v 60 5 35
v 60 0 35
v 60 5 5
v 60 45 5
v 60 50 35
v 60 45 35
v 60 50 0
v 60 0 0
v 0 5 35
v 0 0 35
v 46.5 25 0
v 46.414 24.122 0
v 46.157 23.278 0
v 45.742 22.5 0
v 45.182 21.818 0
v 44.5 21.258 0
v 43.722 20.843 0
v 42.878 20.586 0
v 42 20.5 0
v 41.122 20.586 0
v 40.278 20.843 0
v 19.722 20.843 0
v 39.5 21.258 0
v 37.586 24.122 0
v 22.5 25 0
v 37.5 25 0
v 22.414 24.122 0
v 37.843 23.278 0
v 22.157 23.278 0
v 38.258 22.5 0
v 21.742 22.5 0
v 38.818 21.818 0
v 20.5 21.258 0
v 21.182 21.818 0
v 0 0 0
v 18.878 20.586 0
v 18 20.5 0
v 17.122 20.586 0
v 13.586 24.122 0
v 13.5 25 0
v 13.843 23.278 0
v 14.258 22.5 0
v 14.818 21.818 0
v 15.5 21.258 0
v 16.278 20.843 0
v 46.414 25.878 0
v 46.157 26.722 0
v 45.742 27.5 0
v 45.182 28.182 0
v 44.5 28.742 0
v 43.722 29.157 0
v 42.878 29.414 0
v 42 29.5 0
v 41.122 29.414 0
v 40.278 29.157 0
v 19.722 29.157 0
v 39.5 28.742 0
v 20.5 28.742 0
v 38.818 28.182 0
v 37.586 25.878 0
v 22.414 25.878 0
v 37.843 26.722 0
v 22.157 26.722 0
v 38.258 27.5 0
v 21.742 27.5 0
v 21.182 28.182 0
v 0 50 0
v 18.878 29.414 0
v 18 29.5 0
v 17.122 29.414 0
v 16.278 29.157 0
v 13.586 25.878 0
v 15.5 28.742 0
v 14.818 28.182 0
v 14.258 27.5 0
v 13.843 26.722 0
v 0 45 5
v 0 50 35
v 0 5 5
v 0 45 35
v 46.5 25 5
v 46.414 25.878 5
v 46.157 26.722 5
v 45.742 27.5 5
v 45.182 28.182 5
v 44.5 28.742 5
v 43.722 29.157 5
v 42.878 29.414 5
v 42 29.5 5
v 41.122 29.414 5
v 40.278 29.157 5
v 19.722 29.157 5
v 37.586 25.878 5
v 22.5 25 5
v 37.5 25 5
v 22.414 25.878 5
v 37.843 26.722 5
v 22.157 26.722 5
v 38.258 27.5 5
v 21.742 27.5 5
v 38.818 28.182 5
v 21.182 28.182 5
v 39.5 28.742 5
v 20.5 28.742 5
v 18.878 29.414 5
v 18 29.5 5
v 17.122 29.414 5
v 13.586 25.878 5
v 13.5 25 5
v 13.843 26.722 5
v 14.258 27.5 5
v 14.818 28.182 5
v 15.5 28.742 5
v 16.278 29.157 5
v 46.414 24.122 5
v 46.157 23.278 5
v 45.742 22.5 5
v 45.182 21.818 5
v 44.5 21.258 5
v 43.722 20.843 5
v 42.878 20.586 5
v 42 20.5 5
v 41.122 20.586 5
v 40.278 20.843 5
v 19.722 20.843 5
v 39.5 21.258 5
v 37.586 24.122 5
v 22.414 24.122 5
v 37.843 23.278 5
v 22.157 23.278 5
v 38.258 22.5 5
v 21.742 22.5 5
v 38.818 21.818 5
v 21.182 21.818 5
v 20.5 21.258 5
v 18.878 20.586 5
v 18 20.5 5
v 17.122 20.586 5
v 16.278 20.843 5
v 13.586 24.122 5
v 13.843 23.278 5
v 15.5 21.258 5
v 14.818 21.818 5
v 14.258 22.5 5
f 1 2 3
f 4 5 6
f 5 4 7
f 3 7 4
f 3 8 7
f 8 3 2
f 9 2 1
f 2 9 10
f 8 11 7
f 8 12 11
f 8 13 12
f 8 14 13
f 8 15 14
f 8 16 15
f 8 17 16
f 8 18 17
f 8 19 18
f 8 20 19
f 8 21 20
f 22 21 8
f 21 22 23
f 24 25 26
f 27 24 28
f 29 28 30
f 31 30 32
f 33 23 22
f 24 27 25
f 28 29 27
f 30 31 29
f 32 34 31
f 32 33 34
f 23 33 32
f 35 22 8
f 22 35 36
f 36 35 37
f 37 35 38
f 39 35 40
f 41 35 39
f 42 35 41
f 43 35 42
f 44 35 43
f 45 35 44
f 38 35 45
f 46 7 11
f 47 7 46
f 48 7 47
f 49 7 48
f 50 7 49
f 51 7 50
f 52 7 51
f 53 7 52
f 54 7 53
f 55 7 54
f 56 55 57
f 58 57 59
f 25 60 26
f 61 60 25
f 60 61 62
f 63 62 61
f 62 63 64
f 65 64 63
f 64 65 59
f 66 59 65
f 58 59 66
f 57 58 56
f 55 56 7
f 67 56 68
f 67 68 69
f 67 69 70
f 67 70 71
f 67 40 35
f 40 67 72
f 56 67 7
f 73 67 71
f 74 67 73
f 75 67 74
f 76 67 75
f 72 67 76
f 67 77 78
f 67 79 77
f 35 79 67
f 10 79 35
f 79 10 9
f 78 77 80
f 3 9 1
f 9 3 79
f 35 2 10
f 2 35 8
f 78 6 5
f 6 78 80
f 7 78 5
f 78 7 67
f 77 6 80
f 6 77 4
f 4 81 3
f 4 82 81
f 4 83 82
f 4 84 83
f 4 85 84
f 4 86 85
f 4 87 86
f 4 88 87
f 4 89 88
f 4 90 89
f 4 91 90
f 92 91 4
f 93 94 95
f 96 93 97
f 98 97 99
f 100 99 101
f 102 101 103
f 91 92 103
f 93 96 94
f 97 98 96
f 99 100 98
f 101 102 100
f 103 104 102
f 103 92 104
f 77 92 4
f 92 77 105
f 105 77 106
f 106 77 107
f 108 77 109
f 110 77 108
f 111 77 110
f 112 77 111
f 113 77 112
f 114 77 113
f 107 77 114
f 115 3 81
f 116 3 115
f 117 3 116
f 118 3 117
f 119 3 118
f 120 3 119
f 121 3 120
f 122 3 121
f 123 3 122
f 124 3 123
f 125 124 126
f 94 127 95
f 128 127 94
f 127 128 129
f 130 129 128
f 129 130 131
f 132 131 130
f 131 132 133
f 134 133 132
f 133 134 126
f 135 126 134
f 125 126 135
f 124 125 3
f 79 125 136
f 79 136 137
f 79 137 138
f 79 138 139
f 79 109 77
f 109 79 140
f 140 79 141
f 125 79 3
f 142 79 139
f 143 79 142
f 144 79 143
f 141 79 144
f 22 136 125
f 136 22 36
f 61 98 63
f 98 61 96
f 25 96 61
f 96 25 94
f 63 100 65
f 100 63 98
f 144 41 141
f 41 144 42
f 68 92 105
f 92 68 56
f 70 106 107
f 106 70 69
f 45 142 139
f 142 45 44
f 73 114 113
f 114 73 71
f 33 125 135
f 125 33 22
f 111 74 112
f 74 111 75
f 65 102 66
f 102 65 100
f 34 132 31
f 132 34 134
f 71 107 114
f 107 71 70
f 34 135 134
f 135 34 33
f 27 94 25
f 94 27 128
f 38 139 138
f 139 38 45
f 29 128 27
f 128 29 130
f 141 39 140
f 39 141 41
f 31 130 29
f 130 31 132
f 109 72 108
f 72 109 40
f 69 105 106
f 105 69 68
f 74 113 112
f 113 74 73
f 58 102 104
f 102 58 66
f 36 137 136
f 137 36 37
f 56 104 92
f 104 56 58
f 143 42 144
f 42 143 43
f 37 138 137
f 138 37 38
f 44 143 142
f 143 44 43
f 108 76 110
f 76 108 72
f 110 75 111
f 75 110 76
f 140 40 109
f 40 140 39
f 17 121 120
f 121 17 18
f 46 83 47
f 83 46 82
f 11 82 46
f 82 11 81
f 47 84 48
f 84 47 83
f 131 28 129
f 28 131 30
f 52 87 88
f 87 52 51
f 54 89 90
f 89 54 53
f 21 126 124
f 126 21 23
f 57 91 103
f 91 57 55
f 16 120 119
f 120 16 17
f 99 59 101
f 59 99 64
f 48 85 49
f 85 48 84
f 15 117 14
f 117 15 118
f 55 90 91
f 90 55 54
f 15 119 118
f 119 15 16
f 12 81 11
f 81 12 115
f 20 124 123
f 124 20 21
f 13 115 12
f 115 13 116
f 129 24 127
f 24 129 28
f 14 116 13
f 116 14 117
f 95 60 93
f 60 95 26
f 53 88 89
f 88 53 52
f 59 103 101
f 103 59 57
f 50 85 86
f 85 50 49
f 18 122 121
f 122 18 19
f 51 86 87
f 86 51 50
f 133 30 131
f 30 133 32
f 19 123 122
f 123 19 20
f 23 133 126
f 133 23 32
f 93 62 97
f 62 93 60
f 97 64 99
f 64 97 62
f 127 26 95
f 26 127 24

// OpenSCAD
$fn = 32;

// ----------------------------------------------------------------------
// U-bracket: 60 x 50 x 35 mm
// ----------------------------------------------------------------------

// --- parameters (mm) ---
length = 60;              // outer length, X
width = 50;               // outer width, Y
height = 35;              // upright height, Z
thick = 5;                // wall thickness
hole_d = 9;               // clearance for M8

module hole_z(px, py) {
  translate([px, py, -0.5]) cylinder(h = thick + 1, d = hole_d);
}
module hole_y_pz(pz) {
  /* through both uprights along Y */
  translate([0, -0.5, pz]) rotate([-90, 0, 0]) cylinder(h = width + 1, d = hole_d);
}

module base() {
  cube([length, width, thick]);
}

module uprights() {
  cube([length, thick, height]);
  translate([0, width - thick, 0]) cube([length, thick, height]);
}

difference() {
  union() {
    base();
    uprights();
  }
  hole_z(18, 25);
  hole_z(42, 25);
}
